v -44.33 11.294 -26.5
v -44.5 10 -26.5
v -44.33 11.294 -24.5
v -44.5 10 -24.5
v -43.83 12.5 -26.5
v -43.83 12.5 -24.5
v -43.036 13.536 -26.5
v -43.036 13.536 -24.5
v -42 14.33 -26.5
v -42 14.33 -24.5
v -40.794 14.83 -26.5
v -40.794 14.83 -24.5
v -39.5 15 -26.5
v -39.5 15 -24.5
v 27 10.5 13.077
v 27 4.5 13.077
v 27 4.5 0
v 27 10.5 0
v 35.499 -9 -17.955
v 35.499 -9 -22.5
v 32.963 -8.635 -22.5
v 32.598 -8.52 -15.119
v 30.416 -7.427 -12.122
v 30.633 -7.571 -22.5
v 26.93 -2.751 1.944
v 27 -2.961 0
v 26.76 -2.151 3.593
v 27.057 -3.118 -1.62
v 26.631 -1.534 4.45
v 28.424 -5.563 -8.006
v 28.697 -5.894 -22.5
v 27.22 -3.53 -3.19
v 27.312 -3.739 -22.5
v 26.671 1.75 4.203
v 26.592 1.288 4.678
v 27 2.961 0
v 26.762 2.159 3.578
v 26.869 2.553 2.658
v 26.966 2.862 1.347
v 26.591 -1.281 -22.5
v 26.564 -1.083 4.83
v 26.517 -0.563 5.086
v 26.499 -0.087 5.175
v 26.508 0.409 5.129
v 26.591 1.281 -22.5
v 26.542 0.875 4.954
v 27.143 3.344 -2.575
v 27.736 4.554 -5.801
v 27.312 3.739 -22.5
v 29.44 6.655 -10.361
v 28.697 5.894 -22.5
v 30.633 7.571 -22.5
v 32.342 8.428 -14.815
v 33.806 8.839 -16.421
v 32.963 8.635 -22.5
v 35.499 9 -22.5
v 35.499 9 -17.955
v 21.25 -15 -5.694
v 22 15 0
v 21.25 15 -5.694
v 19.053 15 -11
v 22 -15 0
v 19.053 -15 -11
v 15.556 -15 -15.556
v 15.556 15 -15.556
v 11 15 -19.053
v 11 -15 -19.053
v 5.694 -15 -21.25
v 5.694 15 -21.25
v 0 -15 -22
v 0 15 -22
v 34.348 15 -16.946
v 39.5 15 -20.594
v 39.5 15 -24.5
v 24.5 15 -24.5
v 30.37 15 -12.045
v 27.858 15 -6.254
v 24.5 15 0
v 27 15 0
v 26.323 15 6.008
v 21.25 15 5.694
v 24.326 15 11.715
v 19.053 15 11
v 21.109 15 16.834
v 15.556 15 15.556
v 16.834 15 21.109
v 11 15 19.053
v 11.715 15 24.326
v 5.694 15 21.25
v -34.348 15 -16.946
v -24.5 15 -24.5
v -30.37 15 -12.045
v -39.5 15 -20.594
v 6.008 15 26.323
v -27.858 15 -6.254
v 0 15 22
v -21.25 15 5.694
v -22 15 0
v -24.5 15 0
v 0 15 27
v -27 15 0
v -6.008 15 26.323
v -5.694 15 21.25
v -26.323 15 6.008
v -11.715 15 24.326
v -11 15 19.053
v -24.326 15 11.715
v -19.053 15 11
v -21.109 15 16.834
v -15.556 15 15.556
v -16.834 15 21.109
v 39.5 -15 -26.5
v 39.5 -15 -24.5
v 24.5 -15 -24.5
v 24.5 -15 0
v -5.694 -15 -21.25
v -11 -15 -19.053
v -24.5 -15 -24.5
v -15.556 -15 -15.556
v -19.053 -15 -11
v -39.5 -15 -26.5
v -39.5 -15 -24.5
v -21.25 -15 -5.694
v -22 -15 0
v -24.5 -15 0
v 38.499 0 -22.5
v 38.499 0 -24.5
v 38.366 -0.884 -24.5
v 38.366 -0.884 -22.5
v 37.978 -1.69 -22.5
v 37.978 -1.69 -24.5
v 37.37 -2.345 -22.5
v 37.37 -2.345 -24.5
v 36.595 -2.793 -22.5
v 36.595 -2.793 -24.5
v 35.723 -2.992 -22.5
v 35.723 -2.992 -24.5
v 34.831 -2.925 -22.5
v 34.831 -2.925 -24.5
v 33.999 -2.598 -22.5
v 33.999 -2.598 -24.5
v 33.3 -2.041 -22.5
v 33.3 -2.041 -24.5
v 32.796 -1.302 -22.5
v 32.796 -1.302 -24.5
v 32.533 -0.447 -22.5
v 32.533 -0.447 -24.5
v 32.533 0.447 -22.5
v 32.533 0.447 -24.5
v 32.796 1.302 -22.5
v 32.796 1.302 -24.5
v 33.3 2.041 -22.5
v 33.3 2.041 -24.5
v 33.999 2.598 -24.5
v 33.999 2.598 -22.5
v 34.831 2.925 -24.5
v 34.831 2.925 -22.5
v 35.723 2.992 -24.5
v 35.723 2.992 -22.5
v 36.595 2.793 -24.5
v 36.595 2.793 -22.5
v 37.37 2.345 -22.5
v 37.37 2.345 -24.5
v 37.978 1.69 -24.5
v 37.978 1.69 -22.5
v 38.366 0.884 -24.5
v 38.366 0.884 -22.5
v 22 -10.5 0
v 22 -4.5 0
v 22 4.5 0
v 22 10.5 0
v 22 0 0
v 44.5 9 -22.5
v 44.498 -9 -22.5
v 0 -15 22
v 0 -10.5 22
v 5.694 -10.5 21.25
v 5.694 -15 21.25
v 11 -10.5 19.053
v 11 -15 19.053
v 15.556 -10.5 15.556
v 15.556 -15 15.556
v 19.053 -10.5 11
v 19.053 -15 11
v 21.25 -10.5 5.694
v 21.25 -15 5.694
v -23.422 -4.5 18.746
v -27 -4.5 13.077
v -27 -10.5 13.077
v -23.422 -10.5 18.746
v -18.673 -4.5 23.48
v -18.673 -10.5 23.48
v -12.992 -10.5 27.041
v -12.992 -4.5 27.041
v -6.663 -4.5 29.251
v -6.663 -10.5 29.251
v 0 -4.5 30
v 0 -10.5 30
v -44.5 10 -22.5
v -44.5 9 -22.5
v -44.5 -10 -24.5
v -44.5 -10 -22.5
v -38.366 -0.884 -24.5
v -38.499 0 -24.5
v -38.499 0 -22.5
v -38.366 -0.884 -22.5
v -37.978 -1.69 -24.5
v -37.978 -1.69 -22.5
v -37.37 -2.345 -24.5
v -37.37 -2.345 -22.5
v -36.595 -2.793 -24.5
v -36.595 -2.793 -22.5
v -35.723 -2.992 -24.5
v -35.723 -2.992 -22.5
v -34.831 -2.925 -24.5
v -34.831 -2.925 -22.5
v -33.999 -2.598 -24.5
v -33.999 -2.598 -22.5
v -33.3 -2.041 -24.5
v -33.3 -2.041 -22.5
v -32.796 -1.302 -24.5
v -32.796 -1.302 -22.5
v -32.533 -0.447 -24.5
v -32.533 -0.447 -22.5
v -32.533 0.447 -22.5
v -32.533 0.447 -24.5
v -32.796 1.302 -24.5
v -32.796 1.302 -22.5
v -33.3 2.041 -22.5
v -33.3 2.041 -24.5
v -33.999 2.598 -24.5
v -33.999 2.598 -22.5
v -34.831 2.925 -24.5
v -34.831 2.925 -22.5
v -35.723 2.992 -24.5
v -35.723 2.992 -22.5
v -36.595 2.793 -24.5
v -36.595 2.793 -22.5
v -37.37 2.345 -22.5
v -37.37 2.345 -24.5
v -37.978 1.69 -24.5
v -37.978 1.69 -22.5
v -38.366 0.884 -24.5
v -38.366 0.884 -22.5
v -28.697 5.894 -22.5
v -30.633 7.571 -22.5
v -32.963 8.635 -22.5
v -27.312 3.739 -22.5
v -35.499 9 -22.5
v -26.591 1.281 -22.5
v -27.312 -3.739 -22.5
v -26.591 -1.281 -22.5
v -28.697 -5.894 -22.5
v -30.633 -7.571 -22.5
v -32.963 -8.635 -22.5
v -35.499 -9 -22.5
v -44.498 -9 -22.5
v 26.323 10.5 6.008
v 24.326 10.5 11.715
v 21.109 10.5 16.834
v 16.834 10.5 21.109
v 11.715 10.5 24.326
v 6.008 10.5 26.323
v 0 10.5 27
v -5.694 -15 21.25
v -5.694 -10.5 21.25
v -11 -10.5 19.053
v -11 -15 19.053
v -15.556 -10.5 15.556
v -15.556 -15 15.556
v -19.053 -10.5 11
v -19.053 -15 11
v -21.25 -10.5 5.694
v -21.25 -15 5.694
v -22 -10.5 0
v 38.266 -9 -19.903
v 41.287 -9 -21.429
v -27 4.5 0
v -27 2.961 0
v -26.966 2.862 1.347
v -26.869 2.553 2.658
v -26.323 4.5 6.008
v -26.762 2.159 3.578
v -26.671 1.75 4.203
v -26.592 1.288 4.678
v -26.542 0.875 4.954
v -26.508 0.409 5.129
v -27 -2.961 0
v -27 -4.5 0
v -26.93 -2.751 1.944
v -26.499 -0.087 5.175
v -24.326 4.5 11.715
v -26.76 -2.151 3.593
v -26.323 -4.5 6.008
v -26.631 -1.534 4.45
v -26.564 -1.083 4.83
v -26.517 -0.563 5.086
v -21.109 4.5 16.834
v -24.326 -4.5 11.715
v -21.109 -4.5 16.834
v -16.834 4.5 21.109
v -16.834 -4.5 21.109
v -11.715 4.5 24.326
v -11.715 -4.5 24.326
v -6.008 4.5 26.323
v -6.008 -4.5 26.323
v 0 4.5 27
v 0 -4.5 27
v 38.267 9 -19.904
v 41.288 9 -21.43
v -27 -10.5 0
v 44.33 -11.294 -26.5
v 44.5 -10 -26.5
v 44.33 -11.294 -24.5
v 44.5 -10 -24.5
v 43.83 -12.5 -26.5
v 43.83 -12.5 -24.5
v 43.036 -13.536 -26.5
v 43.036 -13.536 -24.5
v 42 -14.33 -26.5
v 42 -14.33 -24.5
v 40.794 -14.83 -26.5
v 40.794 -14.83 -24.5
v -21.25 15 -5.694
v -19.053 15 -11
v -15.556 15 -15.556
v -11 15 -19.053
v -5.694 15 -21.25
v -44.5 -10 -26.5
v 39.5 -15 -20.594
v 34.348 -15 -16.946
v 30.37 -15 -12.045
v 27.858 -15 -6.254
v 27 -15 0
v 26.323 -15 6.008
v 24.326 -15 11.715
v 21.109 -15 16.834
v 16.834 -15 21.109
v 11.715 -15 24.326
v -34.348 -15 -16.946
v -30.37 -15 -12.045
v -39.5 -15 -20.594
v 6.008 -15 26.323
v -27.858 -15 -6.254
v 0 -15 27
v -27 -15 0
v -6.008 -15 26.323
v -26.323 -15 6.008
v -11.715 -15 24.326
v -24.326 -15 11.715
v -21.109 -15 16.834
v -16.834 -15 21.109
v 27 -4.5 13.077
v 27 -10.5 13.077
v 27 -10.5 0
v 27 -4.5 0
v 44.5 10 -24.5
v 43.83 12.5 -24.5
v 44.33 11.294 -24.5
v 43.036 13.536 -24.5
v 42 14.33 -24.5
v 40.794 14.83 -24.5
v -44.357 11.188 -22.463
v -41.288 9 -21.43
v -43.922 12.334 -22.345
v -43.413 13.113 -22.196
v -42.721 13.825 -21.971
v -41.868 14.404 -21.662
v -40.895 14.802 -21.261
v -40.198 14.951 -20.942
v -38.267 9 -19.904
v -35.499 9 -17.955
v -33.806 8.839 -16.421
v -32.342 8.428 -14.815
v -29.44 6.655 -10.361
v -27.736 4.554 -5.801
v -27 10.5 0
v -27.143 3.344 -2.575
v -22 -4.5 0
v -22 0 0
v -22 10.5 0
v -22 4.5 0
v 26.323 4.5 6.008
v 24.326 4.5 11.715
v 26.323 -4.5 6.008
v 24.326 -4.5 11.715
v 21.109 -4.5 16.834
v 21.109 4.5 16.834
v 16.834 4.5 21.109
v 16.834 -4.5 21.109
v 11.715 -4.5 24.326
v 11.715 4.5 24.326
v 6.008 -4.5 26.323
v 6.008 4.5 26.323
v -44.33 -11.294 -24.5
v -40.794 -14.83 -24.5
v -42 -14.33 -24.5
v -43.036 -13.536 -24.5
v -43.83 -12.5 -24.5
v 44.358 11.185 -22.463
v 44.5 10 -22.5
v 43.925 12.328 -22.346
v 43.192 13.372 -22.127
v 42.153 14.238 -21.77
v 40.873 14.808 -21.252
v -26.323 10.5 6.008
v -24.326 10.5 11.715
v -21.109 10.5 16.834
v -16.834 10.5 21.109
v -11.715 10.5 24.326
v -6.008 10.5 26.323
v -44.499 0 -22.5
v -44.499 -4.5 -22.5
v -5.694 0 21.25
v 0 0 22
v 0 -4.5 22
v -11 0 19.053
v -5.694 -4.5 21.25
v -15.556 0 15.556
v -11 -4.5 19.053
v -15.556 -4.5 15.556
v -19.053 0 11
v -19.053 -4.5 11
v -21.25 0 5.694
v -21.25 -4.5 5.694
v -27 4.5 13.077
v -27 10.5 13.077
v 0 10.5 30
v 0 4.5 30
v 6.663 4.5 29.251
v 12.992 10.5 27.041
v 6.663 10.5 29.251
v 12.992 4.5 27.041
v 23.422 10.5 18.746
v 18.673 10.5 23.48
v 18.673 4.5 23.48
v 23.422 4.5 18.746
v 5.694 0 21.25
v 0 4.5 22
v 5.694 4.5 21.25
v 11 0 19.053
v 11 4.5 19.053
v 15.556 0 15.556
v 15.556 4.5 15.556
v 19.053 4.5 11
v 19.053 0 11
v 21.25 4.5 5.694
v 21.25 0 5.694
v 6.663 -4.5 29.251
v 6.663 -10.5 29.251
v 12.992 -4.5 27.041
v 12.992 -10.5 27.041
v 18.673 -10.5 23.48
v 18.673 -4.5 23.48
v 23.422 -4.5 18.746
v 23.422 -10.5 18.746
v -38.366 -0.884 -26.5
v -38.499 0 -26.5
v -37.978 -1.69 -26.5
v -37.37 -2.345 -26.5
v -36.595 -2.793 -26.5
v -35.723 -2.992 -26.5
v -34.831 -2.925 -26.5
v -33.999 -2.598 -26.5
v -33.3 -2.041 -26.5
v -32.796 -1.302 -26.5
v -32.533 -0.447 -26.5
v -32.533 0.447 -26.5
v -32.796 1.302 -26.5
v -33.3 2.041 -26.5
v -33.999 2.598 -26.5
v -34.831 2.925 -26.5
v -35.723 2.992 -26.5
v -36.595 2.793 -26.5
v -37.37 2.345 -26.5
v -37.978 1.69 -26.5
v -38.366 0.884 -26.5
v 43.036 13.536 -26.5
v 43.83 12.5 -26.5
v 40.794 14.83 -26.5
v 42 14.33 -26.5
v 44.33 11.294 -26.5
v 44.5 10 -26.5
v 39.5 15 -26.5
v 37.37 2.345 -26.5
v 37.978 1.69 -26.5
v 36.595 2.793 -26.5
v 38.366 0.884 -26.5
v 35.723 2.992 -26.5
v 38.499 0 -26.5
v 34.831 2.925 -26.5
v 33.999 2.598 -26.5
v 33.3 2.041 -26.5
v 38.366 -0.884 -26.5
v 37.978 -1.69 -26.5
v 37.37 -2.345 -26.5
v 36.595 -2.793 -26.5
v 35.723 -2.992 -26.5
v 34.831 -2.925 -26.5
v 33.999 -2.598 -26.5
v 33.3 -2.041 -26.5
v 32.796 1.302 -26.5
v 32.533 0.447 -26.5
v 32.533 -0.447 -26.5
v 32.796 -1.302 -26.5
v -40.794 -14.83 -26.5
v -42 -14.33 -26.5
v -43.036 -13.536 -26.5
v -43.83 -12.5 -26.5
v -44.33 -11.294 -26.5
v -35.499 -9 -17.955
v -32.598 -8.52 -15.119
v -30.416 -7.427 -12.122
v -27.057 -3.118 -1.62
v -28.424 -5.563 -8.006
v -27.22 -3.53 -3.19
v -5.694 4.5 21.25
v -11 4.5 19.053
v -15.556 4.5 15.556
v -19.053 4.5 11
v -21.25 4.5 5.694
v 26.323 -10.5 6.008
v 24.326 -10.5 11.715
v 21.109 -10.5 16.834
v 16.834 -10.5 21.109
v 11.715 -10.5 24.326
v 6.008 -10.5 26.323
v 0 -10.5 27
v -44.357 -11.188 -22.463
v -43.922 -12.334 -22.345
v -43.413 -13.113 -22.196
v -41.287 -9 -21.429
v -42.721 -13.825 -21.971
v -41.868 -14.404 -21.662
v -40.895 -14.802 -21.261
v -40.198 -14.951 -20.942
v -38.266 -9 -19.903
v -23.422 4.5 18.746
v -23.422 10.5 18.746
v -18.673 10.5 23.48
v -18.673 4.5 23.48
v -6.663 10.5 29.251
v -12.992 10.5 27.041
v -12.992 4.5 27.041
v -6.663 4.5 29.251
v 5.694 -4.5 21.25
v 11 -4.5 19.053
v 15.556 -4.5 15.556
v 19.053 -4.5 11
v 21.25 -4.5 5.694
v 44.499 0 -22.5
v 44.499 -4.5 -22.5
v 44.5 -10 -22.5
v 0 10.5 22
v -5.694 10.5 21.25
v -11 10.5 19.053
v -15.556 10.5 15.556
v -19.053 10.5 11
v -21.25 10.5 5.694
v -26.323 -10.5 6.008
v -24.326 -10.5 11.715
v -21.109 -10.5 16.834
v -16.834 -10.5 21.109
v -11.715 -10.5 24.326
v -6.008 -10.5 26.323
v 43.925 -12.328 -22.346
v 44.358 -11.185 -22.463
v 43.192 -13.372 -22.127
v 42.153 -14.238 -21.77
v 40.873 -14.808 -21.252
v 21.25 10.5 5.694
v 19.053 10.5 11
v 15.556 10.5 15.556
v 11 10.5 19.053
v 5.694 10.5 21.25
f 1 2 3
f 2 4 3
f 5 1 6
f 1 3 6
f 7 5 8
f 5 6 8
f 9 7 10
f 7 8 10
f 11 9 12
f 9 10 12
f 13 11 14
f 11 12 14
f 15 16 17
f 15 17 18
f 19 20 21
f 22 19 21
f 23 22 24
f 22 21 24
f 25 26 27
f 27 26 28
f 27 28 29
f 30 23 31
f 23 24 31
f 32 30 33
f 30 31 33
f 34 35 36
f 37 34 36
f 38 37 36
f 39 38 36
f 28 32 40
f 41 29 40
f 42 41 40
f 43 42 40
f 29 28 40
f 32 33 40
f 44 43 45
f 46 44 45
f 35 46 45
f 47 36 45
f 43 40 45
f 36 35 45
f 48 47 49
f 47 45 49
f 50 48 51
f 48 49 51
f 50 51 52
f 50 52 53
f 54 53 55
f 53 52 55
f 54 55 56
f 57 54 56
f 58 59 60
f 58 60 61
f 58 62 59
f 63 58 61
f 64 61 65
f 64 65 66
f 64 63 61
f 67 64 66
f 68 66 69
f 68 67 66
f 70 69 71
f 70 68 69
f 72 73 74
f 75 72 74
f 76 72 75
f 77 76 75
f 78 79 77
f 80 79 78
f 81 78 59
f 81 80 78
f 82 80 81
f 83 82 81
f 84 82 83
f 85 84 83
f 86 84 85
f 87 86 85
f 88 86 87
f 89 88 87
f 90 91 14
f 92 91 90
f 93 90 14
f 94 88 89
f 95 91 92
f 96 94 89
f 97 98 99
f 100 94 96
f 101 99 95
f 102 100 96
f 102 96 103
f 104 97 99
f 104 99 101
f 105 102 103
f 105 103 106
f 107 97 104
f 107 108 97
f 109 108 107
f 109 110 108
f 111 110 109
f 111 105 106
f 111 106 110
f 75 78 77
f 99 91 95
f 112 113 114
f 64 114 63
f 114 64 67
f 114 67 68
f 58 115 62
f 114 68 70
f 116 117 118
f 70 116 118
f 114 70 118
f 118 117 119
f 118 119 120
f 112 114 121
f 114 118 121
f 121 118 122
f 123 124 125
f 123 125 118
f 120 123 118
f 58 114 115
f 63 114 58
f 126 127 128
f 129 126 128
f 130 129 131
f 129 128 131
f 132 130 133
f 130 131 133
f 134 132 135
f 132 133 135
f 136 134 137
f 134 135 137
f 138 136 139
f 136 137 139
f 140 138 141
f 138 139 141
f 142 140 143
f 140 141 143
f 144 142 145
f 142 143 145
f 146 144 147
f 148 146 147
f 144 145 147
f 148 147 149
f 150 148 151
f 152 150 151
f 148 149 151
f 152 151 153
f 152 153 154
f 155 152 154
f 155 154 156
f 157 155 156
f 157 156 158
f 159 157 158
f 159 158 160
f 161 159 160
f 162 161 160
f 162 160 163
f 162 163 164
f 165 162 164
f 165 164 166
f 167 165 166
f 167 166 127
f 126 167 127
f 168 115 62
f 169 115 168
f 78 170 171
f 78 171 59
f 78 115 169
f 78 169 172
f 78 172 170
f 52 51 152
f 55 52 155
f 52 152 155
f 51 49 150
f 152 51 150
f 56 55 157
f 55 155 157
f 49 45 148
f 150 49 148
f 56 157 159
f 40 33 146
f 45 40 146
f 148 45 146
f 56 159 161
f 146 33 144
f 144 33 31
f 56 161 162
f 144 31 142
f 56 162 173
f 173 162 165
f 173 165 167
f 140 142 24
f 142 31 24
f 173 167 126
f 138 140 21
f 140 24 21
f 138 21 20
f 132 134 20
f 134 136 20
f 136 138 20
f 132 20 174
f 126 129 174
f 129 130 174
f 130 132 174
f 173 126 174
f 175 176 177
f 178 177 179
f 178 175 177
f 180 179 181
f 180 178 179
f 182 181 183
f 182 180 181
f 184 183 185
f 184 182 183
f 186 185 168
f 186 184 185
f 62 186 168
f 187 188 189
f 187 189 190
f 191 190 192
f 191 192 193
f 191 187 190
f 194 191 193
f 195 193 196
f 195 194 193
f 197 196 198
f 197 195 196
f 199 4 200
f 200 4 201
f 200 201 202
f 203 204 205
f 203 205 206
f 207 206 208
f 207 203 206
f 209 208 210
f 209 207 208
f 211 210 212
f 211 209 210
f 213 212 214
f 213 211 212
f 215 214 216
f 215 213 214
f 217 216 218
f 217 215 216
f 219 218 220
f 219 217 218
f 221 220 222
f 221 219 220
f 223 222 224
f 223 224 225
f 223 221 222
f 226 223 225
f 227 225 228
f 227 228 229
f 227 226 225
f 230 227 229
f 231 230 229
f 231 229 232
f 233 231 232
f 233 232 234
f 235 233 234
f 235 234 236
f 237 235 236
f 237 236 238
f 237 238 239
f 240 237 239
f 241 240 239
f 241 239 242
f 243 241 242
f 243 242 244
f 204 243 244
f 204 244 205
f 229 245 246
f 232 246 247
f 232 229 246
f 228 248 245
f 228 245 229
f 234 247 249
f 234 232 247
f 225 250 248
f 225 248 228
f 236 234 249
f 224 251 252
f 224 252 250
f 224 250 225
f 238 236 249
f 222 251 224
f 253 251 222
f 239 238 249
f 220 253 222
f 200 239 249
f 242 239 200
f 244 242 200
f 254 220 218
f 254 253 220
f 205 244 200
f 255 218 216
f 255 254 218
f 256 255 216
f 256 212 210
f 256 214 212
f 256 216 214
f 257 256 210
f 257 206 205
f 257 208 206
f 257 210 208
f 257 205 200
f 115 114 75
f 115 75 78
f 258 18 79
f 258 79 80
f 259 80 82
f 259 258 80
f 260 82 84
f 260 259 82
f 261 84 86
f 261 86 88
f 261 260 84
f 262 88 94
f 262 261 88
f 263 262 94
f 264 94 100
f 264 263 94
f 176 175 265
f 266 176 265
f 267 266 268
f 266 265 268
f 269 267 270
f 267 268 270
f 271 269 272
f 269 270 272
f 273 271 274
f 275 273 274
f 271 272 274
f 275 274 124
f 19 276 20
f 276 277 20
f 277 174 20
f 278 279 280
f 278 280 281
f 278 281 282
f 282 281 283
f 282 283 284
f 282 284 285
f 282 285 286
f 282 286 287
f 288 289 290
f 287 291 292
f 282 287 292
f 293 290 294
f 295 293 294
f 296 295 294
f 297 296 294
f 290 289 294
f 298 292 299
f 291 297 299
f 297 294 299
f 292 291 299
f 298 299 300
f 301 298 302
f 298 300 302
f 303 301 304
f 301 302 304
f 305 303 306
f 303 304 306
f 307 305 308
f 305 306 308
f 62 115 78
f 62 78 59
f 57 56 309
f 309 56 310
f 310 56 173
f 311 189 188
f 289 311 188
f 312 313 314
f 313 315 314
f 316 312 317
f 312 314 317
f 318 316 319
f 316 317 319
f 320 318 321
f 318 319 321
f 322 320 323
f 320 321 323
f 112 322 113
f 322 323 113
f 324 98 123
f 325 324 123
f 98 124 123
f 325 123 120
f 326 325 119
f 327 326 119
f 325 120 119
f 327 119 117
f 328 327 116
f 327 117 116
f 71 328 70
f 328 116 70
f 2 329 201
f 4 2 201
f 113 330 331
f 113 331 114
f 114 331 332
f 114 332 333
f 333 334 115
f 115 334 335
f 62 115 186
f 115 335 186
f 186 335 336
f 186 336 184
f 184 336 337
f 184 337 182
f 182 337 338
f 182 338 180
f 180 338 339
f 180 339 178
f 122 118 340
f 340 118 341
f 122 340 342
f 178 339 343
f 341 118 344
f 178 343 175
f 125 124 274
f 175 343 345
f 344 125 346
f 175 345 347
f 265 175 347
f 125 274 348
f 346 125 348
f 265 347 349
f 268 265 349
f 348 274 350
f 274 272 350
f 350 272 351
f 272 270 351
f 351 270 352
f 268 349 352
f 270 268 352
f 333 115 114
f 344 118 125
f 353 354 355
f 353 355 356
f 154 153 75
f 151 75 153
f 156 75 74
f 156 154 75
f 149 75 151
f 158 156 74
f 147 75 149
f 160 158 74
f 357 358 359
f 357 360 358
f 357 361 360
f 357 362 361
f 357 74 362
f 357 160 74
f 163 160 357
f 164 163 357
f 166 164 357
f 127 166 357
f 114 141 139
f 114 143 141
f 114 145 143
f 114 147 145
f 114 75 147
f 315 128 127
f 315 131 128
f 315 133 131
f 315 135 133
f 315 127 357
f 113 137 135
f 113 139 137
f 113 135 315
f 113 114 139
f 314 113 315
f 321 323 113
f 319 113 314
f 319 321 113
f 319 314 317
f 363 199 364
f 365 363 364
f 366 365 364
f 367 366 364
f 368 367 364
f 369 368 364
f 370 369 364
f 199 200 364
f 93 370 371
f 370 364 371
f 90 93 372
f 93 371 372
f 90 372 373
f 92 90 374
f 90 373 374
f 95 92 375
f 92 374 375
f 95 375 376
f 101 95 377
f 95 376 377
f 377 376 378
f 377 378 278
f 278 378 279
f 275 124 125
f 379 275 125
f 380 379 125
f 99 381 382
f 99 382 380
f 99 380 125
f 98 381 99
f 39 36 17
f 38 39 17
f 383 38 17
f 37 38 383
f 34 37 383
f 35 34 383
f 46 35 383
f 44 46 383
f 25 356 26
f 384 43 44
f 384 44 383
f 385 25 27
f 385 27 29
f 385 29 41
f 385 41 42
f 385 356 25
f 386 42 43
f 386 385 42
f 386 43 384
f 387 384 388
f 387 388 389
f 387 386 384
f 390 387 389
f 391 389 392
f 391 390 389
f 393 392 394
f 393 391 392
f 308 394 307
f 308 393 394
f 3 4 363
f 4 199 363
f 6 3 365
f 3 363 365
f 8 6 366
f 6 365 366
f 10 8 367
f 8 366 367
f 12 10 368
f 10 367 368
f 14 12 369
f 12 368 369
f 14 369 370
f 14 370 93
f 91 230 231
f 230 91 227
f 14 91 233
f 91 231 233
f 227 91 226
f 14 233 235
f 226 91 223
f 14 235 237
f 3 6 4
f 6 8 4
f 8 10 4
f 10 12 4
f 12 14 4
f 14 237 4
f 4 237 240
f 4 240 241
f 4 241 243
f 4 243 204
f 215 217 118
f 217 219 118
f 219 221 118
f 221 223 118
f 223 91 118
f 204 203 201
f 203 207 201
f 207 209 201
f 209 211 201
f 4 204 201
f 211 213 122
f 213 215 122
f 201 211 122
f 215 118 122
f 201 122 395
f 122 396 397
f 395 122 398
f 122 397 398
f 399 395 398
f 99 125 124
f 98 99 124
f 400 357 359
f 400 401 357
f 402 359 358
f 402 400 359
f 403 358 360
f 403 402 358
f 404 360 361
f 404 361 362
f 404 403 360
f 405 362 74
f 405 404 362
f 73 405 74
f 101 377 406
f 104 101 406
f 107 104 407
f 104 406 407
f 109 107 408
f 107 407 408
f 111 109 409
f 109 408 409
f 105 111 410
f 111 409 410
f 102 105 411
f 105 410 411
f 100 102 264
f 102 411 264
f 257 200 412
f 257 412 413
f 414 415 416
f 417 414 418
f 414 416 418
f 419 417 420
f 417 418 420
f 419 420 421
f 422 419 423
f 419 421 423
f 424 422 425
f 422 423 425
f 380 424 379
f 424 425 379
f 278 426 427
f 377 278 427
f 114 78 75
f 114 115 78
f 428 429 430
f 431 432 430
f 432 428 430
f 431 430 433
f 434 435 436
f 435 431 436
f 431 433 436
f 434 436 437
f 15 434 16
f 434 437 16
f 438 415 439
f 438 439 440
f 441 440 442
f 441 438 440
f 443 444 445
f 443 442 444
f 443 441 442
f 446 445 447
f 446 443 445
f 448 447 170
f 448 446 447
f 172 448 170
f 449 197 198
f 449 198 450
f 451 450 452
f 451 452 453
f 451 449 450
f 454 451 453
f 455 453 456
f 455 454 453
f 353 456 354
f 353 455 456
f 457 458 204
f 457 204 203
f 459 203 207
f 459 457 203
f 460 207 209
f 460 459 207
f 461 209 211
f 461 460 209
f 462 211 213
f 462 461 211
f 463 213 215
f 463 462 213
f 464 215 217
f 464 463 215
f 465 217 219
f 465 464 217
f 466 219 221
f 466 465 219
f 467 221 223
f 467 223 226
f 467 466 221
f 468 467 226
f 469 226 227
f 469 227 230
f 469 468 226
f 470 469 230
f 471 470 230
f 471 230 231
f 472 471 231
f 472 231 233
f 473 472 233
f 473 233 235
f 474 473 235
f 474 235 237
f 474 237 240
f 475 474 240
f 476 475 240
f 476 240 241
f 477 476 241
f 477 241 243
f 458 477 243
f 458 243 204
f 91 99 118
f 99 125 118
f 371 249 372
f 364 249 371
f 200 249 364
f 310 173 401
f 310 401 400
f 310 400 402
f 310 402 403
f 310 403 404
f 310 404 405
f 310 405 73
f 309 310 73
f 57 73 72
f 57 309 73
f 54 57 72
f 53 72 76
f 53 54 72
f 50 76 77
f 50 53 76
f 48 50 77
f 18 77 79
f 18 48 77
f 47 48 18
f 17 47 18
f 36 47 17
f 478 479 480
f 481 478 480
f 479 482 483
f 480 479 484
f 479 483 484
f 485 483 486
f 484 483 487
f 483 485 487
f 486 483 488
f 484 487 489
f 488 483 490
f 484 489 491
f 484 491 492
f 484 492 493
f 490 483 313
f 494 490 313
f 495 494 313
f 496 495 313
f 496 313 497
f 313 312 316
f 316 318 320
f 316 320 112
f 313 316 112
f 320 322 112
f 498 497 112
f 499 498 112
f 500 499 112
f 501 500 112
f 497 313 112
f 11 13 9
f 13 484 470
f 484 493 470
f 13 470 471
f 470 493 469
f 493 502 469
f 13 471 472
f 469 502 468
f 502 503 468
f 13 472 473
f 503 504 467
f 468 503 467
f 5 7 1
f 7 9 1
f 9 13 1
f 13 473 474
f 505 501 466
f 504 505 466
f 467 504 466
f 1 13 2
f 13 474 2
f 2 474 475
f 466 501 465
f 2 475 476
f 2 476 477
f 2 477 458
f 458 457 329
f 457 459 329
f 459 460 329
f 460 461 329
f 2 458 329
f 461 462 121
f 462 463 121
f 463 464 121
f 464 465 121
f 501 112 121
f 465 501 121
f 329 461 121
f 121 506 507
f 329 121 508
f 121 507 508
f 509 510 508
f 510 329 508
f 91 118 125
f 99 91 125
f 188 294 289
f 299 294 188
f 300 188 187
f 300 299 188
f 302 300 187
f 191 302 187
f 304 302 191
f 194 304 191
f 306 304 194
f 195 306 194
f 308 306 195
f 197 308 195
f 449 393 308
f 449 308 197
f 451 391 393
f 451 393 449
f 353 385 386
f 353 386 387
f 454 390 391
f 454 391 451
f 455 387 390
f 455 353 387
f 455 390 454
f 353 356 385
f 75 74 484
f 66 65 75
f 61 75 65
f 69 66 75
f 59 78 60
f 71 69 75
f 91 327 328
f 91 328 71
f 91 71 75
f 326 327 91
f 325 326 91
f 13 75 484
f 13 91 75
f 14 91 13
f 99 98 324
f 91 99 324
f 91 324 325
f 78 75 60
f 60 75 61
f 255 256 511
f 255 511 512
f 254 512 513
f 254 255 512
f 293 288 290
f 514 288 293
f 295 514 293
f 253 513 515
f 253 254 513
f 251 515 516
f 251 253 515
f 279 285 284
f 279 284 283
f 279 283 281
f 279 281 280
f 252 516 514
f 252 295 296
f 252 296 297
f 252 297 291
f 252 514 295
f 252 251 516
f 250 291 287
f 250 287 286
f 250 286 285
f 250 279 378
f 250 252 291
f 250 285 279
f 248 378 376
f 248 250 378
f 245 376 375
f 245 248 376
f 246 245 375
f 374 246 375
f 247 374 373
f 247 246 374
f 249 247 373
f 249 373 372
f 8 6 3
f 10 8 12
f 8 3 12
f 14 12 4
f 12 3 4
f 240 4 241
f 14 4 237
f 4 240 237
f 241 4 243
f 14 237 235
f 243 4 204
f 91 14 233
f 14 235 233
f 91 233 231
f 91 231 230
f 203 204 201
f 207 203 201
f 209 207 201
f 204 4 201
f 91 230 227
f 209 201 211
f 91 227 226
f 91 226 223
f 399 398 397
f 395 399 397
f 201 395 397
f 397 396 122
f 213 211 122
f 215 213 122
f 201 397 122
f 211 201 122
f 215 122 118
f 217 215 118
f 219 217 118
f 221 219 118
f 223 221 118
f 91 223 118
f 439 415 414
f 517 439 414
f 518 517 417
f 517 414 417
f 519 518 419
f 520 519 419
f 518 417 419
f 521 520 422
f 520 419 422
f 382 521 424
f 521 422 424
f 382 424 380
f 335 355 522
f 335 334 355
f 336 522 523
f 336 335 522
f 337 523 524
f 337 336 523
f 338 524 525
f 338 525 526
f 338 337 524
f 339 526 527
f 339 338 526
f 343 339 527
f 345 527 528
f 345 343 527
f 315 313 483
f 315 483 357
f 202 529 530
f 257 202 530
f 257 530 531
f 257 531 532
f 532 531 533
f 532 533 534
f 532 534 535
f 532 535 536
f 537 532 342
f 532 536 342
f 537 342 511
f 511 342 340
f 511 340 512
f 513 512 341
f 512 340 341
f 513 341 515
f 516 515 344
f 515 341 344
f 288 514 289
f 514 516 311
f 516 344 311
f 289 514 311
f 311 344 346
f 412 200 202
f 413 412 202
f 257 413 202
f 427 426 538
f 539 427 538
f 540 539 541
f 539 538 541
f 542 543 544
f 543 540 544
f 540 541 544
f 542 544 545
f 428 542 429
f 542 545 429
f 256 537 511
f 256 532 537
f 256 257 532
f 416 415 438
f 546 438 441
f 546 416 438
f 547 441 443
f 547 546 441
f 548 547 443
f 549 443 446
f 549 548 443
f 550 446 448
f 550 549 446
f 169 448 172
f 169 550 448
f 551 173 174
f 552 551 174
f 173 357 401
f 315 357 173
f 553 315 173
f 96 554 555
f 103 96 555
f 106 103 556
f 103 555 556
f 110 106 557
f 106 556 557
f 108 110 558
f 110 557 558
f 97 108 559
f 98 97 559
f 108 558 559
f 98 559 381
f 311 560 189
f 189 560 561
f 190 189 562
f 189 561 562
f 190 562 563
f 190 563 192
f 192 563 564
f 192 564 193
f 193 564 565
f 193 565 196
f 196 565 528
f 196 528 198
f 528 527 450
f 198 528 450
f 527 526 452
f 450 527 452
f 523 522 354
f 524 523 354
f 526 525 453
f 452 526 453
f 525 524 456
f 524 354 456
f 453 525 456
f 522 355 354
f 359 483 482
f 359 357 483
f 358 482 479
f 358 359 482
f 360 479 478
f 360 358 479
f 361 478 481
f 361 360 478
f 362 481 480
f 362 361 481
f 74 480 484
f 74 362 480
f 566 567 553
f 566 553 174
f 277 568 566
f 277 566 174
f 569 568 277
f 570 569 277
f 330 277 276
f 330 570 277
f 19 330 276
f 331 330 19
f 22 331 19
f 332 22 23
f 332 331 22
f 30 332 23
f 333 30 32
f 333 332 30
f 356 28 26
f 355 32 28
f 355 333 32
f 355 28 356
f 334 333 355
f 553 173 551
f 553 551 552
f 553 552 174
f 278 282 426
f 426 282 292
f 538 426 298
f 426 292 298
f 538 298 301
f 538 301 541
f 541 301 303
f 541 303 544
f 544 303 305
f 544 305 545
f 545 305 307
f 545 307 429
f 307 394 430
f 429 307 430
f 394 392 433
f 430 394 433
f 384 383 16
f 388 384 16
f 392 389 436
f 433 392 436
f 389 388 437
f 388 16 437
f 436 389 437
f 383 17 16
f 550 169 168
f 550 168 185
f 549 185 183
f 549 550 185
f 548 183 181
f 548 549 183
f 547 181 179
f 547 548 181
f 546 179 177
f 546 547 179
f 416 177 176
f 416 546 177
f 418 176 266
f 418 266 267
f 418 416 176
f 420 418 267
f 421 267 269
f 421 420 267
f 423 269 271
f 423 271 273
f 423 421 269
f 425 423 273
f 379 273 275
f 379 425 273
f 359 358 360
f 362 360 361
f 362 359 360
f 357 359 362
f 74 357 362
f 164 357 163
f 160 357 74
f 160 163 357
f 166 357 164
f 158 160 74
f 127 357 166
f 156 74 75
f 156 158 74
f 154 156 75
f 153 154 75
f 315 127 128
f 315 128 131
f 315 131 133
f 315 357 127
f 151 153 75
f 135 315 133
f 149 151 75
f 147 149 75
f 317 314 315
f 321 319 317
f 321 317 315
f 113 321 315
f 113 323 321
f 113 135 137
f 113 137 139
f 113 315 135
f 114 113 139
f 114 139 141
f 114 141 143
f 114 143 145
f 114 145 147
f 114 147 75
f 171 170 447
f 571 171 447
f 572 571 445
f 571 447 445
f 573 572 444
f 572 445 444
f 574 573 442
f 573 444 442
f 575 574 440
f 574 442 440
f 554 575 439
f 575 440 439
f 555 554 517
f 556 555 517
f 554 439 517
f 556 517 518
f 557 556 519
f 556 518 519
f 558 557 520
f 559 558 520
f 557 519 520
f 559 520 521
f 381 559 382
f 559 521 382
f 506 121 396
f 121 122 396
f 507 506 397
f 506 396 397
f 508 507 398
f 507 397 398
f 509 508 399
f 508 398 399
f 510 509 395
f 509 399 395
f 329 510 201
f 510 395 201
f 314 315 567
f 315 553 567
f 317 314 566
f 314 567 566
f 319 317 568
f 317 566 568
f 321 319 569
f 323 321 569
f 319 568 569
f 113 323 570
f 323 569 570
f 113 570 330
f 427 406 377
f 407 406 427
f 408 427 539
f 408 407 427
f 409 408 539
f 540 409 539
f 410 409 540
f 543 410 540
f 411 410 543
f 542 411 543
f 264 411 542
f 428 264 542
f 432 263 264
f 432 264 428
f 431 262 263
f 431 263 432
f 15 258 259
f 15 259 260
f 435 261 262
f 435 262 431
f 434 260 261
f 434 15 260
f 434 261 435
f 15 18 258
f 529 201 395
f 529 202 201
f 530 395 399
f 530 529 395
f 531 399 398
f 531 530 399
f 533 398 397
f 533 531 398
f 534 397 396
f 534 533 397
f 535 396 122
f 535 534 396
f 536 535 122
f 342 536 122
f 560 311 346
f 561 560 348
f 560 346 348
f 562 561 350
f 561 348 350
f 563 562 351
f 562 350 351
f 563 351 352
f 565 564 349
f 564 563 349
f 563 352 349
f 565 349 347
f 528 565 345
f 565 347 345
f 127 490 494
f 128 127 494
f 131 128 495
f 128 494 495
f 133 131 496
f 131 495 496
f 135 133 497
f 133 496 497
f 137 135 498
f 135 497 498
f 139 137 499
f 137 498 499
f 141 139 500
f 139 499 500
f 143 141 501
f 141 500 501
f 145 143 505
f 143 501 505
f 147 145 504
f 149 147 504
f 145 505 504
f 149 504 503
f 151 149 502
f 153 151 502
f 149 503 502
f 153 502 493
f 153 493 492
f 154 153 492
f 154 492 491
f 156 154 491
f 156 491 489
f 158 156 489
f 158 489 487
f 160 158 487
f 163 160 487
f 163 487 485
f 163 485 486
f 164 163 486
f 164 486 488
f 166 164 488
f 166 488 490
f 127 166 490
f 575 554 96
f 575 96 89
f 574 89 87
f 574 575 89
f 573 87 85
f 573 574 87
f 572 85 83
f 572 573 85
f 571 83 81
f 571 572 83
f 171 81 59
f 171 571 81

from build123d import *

# Parameters (mm, degrees)
F1_DEPTH       = 15
F1_DEPTH_BACK  = 15
F2_DEPTH       = 15
F2_DEPTH_BACK  = 15
F3_R           = 3
F4_DEPTH       = 53.501
F7_START       = -4
F6_R           = 3
F7_DEPTH       = 36
F9_W           = 6
F9_H           = 30
F10_DEPTH      = 27
F10_DEPTH_BACK = 27
F12_R          = 5
F12_2_R        = 5
F11_R          = 22
F13_DEPTH      = 25
F13_DEPTH_BACK = 25


with BuildPart() as f1:
    # F0 (on Front) → F1 (new body, two sides)
    with BuildSketch(Plane.XZ) as f1_sk:
        with BuildLine():
            Line((0, -26.5), (44.5, -26.5))
            Line((44.5, -26.5), (44.5, -24.5))
            Line((44.5, -24.5), (24.5, -24.5))
            Line((24.5, -24.5), (24.5, 0))
            Line((24.5, 0), (22, 0))
            ThreePointArc((22, 0), (15.5563491861, -15.5563491861), (0, -22))
            Line((0, -22), (0, -26.5))
        make_face()
    extrude(amount=F1_DEPTH)
    extrude(f1_sk.sketch, amount=-F1_DEPTH_BACK)


with BuildPart() as f2:
    # F0 (on Front) → F2 (new body, two sides)
    with BuildSketch(Plane.XZ) as f2_sk:
        with BuildLine():
            Line((24.5, -24.5), (44.5, -24.5))
            Line((44.5, -24.5), (44.5, -22.5))
            Line((44.5, -22.5), (27, -22.5))
            Line((27, -22.5), (27, 0))
            ThreePointArc((27, 0), (19.091883092, 19.091883092), (0, 27))
            Line((0, 27), (0, 22))
            ThreePointArc((0, 22), (15.5563491861, 15.5563491861), (22, 0))
            Line((22, 0), (24.5, 0))
            Line((24.5, 0), (24.5, -24.5))
        make_face()
        with BuildLine():
            Line((27, -22.5), (44.5, -22.5))
            ThreePointArc((44.5, -22.5), (31.8900378109, -14.2521928137), (27, 0))
            Line((27, 0), (27, -22.5))
        make_face()
    extrude(amount=F2_DEPTH)
    extrude(f2_sk.sketch, amount=-F2_DEPTH_BACK)


with BuildPart() as f4_tool:
    # F3 (on face) → F4 (new body, through all)
    with BuildSketch(Plane(origin=(0, 0, -26.5), x_dir=(1, 0, 0), z_dir=(0, 0, -1))):
        with Locations((35.4990586638, 0)):
            Circle(F3_R)
    extrude(amount=-F4_DEPTH)


with BuildPart() as f1_1:
    add(f1.part)

    # F4: cut by f4_tool
    add(f4_tool.part, mode=Mode.SUBTRACT)

    # F5: F1 across plane


with BuildPart() as f2_1:
    add(f2.part)

    # F4: cut by f4_tool
    add(f4_tool.part, mode=Mode.SUBTRACT)

    # F6 (on face) → F7 (cut)
    with BuildSketch(Plane(origin=(0, 0, -26.5), x_dir=(1, 0, 0), z_dir=(0, 0, -1)).offset(F7_START)):
        with BuildLine():
            Line((35.4990586638, -9), (44.5, -9))
            Line((44.5, -9), (44.4981174261, 9))
            Line((44.4981174261, 9), (35.4990586638, 9))
            ThreePointArc((35.4990586638, 9), (26.4990586638, 0), (35.4990586638, -9))
        make_face()
        with Locations((35.4990586638, 0)):
            Circle(F6_R, mode=Mode.SUBTRACT)
    extrude(amount=-F7_DEPTH, mode=Mode.SUBTRACT)

    # F8: F2 across plane


with BuildPart() as f1_2:
    add(f1_1.part)
    add(f1_1.part.mirror(Plane.YZ))

    # F12
    f12_edges = [f1_2.edges().sort_by_distance(p)[0] for p in [
        (-44.5, 15, -25.5),
        (-44.5, -15, -25.5),
        (44.5, -15, -25.5),
        (44.5, 15, -25.5),
    ]]
    fillet(f12_edges, radius=F12_R)


with BuildPart() as f2_2:
    add(f2_1.part)
    add(f2_1.part.mirror(Plane.YZ))

    # F9 (on Right) → F10 (join, two sides)
    with BuildSketch(Plane.YZ) as f10_sk:
        with Locations((7.5, 15)):
            Rectangle(F9_W, F9_H)
        with Locations((-7.5, 15)):
            Rectangle(F9_W, F9_H)
    extrude(amount=F10_DEPTH)
    extrude(f10_sk.sketch, amount=-F10_DEPTH_BACK)

    # F12#2
    f12_2_edges = [f2_2.edges().sort_by_distance(p)[0] for p in [
        (-44.5, 15, -23.5),
        (-44.5, -15, -23.5),
        (44.5, -15, -23.5),
        (44.5, 15, -23.5),
    ]]
    fillet(f12_2_edges, radius=F12_2_R)

    # F11 (on Front) → F13 (cut, two sides)
    with BuildSketch(Plane.XZ) as f13_sk:
        with BuildLine():
            Line((30, 0), (42, 0))
            ThreePointArc((42, 0), (0, 42), (-42, 0))
            Line((-42, 0), (-30, 0))
            ThreePointArc((-30, 0), (0, 30), (30, 0))
        make_face()
        Circle(F11_R)
    extrude(amount=-F13_DEPTH, mode=Mode.SUBTRACT)
    extrude(f13_sk.sketch, amount=F13_DEPTH_BACK, mode=Mode.SUBTRACT)


solid = Compound([f1_2.part, f2_2.part])
